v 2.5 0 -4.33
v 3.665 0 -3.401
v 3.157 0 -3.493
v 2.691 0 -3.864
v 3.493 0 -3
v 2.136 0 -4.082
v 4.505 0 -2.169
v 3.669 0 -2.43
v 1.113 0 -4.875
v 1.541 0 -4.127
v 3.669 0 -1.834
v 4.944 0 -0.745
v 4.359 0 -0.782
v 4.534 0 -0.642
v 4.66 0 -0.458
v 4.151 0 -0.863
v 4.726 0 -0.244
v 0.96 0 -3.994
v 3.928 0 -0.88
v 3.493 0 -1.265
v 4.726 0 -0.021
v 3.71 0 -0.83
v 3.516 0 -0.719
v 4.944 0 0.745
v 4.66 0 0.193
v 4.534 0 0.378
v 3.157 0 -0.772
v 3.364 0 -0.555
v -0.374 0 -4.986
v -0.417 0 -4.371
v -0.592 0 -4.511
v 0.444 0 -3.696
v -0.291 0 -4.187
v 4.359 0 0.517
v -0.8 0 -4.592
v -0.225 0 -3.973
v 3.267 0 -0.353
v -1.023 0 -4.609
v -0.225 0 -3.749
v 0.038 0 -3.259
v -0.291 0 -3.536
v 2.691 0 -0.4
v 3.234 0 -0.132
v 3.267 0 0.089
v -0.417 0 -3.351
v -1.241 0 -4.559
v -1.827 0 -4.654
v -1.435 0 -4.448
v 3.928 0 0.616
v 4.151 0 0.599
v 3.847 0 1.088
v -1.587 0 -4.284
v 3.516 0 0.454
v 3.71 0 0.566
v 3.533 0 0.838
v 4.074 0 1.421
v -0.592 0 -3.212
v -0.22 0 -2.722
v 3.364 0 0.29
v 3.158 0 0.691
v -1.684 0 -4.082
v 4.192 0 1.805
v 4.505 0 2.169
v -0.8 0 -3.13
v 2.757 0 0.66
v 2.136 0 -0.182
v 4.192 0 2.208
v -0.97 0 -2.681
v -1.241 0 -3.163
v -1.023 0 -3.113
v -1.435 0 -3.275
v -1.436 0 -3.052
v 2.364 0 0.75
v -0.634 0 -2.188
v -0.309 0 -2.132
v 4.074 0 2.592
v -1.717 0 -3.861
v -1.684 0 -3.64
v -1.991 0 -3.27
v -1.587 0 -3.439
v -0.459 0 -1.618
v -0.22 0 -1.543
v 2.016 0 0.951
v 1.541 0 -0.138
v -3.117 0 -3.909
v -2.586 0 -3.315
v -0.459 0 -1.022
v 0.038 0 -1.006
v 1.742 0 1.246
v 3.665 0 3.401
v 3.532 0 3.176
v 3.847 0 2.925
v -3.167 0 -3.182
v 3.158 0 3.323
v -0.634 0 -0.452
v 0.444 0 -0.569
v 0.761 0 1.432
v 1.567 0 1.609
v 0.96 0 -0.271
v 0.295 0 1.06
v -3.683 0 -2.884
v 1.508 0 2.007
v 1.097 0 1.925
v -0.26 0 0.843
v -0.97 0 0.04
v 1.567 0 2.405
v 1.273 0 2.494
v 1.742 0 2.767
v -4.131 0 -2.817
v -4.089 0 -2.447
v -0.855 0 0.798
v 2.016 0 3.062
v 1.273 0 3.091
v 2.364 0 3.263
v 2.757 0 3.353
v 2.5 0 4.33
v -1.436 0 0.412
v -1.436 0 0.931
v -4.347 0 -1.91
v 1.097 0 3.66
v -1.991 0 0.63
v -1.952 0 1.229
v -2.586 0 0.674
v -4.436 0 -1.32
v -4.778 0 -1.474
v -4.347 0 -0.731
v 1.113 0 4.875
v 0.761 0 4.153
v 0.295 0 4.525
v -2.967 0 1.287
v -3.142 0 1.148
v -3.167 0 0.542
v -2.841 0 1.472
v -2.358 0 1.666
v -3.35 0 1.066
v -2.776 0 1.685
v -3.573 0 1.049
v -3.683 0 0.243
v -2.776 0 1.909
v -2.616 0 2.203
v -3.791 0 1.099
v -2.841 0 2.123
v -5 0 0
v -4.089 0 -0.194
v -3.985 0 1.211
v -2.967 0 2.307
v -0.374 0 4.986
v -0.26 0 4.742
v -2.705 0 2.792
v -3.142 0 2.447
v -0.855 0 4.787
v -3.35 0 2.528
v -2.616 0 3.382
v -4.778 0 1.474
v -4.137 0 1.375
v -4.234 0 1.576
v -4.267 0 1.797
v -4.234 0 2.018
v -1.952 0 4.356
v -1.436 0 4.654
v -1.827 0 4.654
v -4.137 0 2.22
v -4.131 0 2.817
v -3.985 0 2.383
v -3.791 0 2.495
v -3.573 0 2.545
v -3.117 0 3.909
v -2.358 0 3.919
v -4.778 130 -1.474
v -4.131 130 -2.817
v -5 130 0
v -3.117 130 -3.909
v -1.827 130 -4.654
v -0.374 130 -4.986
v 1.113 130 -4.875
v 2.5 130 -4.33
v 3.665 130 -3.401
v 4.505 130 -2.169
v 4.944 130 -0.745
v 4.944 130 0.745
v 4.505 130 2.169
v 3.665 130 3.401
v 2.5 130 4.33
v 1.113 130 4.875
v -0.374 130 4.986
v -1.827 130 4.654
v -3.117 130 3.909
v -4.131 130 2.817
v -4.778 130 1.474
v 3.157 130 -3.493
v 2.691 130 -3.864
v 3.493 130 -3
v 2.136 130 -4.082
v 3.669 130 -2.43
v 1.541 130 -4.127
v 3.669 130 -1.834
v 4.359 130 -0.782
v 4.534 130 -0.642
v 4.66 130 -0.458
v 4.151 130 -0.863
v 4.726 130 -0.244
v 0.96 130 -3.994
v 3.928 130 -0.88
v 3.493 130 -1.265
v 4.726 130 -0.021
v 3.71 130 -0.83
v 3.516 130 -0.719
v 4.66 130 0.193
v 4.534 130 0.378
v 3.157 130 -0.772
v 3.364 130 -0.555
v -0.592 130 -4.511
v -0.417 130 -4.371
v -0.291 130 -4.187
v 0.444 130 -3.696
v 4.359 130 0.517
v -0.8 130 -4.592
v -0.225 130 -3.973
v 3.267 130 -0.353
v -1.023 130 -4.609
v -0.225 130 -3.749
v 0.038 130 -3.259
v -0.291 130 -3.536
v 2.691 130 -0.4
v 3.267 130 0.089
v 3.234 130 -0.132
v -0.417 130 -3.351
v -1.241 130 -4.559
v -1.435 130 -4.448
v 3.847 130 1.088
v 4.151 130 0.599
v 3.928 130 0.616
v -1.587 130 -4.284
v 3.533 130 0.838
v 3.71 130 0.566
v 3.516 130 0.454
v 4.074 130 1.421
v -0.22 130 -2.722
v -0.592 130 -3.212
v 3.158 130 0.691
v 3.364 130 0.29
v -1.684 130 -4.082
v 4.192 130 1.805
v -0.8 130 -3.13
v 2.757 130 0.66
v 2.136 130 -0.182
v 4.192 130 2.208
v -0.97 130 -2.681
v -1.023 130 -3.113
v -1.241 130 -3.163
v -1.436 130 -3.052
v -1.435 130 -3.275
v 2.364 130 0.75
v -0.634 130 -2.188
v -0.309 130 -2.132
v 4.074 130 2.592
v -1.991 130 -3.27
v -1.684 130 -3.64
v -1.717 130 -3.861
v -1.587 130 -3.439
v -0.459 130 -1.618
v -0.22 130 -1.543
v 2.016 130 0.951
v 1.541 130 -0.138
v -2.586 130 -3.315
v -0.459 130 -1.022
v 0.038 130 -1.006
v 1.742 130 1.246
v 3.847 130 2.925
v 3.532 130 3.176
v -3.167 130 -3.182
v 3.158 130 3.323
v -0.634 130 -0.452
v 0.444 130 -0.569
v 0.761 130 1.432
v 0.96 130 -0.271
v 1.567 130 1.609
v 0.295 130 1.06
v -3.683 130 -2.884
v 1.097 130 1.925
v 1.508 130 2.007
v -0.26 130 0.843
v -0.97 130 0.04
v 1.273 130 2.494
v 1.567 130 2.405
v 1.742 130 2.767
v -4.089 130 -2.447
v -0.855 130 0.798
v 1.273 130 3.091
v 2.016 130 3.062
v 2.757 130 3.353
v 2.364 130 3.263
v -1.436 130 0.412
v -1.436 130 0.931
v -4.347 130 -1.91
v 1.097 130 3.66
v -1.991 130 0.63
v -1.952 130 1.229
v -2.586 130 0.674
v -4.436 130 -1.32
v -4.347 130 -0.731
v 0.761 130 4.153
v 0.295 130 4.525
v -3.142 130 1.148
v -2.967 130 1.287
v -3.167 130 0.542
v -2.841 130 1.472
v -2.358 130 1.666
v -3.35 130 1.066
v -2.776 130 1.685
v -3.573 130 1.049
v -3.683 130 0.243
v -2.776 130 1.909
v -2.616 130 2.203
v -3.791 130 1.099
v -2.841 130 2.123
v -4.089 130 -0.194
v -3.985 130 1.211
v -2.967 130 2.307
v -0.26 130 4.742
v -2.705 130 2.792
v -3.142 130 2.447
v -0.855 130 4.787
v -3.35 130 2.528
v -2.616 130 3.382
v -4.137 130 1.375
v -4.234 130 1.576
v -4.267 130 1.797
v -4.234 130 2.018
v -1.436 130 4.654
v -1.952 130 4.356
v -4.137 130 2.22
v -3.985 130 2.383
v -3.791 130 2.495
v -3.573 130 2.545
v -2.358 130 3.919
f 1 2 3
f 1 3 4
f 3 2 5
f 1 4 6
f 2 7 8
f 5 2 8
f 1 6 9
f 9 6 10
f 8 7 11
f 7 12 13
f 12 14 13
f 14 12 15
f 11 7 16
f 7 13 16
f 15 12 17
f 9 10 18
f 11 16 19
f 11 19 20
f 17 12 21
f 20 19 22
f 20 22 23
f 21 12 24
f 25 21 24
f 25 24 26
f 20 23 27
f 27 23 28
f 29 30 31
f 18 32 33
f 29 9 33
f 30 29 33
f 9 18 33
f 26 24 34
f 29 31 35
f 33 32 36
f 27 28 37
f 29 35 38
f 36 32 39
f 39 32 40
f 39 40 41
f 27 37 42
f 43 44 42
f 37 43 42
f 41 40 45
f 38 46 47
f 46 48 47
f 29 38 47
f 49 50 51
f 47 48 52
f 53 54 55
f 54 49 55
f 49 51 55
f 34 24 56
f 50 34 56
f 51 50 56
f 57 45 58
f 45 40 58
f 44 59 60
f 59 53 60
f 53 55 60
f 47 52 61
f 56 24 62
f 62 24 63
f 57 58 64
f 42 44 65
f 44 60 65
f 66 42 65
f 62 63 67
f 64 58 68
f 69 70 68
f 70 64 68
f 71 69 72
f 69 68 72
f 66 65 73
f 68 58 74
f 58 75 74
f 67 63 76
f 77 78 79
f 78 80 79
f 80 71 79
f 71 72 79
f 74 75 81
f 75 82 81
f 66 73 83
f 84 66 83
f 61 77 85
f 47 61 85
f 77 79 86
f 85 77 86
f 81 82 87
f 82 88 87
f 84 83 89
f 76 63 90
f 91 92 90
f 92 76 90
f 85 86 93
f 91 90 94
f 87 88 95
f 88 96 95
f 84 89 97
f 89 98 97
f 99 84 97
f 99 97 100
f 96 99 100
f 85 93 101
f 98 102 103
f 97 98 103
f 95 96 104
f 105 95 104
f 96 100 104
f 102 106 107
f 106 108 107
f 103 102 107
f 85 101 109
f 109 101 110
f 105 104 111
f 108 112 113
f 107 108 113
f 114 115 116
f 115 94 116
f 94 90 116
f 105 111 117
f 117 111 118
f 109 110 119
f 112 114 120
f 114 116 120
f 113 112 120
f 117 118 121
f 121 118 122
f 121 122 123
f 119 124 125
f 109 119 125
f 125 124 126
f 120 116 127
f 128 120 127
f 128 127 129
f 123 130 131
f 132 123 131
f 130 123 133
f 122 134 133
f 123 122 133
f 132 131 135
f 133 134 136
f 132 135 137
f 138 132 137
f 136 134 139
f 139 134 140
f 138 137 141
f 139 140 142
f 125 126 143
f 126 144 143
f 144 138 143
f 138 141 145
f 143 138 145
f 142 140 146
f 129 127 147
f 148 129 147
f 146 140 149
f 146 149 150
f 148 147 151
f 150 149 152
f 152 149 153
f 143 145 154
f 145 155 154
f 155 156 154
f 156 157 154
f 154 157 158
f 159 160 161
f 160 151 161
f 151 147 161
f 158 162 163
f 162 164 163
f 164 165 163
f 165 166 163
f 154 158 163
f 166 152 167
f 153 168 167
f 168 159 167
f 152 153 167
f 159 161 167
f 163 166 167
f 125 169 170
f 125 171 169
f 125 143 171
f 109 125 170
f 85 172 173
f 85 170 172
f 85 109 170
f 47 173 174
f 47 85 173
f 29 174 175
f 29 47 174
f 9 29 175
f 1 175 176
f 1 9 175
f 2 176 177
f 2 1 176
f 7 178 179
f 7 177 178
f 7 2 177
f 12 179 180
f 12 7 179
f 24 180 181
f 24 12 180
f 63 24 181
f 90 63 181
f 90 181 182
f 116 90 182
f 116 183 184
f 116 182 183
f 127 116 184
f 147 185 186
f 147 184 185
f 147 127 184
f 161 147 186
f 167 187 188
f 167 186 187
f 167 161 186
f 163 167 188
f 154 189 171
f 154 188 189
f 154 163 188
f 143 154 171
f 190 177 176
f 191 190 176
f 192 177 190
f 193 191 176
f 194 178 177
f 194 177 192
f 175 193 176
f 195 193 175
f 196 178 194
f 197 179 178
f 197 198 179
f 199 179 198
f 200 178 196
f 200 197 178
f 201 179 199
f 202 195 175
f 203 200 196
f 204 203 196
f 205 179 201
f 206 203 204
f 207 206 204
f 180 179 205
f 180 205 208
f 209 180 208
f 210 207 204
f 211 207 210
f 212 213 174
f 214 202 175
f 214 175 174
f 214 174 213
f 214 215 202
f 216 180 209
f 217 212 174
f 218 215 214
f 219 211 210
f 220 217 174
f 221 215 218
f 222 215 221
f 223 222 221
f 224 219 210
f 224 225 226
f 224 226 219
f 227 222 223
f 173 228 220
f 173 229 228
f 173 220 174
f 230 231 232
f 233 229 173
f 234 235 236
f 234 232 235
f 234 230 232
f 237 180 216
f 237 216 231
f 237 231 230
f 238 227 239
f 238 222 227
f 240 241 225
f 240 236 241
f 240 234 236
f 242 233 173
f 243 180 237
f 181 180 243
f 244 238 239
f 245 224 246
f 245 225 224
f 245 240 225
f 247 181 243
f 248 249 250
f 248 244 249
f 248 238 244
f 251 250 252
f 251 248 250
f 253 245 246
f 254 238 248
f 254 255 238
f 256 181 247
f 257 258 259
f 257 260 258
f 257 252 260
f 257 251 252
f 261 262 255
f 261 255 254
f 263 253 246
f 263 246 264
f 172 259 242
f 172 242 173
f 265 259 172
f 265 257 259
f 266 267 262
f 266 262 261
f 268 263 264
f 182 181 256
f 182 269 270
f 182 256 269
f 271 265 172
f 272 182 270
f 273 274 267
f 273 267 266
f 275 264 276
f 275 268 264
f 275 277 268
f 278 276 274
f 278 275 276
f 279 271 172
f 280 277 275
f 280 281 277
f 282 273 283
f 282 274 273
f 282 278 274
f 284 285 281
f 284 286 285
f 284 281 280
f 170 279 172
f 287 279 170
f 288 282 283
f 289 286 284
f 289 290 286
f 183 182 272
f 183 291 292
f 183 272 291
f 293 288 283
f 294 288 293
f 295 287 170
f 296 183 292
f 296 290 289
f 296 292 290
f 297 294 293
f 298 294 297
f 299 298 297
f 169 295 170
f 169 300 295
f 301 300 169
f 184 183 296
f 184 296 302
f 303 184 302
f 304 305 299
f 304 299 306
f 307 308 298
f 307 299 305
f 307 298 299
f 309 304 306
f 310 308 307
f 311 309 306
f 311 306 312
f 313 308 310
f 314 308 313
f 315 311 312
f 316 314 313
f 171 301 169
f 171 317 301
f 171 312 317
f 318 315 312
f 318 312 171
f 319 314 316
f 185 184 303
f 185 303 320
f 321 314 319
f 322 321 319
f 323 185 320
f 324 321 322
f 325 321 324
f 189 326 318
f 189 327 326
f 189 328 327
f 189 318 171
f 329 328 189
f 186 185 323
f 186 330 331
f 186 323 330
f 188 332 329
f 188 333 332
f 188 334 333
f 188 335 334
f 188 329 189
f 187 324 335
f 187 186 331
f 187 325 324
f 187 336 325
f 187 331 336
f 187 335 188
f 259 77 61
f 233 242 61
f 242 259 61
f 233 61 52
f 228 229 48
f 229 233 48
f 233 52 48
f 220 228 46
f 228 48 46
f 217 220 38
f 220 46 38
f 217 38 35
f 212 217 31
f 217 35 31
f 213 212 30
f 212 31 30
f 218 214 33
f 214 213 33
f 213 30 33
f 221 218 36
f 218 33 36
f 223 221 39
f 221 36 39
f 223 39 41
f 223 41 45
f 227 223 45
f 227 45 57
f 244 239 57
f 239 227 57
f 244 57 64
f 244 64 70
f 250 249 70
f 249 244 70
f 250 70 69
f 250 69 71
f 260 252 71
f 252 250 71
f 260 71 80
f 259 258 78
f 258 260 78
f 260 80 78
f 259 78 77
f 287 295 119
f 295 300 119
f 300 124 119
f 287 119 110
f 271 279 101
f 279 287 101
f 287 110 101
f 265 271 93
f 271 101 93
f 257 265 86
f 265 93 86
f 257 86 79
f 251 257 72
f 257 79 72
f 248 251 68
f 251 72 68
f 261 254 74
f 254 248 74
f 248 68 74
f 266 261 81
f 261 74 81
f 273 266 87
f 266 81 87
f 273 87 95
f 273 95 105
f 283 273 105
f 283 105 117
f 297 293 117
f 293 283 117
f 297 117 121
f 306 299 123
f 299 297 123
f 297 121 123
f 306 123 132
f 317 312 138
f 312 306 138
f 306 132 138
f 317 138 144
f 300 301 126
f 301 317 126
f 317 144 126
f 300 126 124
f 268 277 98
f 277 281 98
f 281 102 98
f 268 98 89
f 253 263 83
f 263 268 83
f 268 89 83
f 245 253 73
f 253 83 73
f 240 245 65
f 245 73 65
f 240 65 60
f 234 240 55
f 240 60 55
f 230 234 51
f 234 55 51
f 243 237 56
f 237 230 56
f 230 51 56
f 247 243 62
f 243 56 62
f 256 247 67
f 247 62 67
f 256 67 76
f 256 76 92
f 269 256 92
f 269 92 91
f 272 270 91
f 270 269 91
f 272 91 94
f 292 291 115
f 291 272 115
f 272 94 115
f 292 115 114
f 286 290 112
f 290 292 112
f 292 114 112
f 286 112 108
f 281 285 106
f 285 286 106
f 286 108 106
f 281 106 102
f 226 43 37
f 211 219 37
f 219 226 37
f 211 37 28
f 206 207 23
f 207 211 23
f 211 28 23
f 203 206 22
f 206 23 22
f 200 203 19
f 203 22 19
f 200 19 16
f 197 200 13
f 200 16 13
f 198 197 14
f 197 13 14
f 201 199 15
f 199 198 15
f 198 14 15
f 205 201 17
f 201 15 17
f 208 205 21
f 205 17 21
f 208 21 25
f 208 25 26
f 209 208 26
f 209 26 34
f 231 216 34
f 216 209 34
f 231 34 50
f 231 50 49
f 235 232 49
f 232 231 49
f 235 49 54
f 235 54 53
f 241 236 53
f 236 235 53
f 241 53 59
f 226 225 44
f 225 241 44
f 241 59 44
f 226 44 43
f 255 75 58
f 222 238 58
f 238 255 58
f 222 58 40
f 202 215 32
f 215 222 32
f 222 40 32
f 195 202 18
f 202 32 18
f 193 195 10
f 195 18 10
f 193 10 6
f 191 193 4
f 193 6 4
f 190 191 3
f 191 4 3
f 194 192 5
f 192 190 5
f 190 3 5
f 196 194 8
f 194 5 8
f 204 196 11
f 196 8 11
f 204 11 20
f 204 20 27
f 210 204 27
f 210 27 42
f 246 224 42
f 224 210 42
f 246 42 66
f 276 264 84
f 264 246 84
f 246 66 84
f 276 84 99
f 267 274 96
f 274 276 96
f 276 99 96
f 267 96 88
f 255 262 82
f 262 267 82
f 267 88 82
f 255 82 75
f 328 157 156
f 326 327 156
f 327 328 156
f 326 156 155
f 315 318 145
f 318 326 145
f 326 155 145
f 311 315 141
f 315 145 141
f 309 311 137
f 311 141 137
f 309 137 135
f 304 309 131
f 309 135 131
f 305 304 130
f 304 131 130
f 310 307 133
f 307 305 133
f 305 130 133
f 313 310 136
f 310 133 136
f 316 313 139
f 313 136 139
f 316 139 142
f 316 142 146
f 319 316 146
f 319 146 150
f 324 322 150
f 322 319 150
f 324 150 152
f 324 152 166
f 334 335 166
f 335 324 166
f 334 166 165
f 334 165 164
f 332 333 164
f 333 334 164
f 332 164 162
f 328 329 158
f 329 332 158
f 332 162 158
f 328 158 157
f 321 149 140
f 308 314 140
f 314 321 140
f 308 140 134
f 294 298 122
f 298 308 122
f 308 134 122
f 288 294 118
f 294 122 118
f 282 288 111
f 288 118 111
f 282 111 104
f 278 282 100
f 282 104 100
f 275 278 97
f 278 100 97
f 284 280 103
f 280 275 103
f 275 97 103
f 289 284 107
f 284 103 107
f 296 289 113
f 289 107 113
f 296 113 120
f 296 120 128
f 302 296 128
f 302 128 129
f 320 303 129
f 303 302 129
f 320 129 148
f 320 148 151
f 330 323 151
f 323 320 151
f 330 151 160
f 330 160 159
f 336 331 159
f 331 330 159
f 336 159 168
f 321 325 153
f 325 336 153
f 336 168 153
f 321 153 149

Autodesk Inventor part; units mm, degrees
ref_plane "YZ Plane" through (0, 0, 0) normal (1, 0, 0) x (0, 1, 0)
ref_plane "XZ Plane" through (0, 0, 0) normal (0, 1, 0) x (-1, 0, 0)
ref_plane "XY Plane" through (0, 0, 0) normal (0, 0, 1) x (1, 0, 0)
sketch "Sketch1" plane through (0, 0, 0) normal (0, 1, 0) x (-1, 0, 0)
  circle A0 centre (0, 0) radius 5
  circle A1 centre (0.7051, 2.7925) radius 2
  circle A2 centre (-1.6909, -2.1323) radius 2
  circle A3 centre (2.4362, -1.3202) radius 2
  circle A4 centre (-2.8575, 2.0067) radius 1.35
  circle A5 centre (3.5172, 1.7971) radius 0.75
  circle A6 centre (0.9671, -3.8612) radius 0.75
  circle A7 centre (-3.984, -0.1323) radius 0.75
  point P0 (2.4362, -7.492)
  point P1 (2.4362, -7.492)
  dimension "d0" = 10
  dimension "d1" = 4
  dimension "d2" = 4
  dimension "d3" = 4
  dimension "d5" = 2.7
  dimension "d6" = 1.5
  dimension "d7" = 1.5
  dimension "d8" = 1.5
extrude "Extrusion1" add sketch "Sketch1" along normal blind 130
sketch "Sketch2" plane through (0, 0, 0) normal (0, -1, 0) x (1, 0, 0)
  point P0 (0, 0)
sketch "Sketch3" plane through (0, 0, 0) normal (0, -1, 0) x (1, 0, 0)
  point P0 (0, 0)
properties part number "outer casing"
